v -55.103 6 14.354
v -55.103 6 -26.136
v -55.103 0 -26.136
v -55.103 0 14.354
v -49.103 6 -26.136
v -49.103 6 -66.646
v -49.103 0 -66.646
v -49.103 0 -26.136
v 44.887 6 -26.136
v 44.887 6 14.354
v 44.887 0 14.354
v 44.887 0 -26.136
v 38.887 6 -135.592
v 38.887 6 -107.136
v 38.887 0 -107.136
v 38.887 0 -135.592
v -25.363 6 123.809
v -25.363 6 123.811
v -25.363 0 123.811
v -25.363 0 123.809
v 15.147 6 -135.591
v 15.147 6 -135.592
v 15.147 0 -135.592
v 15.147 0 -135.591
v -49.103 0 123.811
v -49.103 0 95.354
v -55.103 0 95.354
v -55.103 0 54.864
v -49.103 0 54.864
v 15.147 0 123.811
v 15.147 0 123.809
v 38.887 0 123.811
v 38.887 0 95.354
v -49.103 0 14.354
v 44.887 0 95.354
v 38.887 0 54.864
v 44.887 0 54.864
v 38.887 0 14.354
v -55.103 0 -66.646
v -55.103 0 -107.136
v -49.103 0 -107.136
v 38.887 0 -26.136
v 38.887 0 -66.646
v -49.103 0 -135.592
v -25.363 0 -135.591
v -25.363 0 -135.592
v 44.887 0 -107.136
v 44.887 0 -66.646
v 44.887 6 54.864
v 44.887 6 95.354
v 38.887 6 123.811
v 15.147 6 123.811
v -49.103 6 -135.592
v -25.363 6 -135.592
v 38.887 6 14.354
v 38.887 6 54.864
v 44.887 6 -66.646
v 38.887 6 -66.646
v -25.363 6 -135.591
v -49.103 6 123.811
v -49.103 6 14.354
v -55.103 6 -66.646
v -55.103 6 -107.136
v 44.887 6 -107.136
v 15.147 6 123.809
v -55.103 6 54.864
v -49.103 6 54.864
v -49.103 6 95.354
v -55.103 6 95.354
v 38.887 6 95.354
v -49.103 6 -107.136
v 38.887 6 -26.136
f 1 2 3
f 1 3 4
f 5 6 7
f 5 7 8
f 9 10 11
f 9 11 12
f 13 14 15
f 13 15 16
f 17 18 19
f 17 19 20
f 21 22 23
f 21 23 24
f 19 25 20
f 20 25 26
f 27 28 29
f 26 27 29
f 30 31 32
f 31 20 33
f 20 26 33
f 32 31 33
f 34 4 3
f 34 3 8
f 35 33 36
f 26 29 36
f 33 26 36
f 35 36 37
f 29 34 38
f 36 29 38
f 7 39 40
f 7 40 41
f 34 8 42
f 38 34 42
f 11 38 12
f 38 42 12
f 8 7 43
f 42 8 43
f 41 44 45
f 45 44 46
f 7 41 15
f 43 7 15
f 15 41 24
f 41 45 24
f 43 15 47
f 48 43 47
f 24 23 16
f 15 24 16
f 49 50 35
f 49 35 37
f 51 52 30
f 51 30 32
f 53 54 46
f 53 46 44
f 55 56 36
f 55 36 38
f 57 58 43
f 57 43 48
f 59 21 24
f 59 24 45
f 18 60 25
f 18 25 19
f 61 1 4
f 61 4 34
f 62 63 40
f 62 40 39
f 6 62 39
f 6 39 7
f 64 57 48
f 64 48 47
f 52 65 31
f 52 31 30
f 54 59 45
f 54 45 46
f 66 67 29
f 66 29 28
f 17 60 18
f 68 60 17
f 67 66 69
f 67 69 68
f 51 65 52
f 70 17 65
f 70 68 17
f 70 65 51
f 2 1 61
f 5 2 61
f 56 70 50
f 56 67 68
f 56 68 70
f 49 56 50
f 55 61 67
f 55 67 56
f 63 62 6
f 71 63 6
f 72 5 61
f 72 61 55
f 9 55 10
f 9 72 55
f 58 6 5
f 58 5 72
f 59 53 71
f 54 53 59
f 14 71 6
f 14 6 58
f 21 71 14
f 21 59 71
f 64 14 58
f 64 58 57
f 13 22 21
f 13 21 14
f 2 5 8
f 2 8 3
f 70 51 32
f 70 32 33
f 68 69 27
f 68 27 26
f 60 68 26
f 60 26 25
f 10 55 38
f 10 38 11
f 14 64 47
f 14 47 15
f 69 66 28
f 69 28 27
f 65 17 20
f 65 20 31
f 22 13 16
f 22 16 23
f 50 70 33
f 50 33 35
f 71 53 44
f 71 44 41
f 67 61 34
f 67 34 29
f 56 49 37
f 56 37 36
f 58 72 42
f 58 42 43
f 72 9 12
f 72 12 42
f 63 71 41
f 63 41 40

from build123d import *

# Parameters (mm, degrees)
SKETCH1_W               = 517.884603554
SKETCH1_H               = 307.545036654
BOSS_EXTRUDE1_DEPTH     = 6
CUT_EXTRUDE_THIN1_DEPTH = 302.219360338


with BuildPart() as part:
    # Sketch1 → Boss-Extrude1 (new body)
    with BuildSketch(Plane(origin=(0, 0, 0), x_dir=(1, 0, 0), z_dir=(0, 1, 0))):
        Rectangle(SKETCH1_W, SKETCH1_H)
    extrude(amount=BOSS_EXTRUDE1_DEPTH)

    # Sketch2 → Cut-Extrude-Thin1 (cut, through all)
    with BuildSketch(Plane(origin=(0, 6, 0), x_dir=(1, 0, 0), z_dir=(0, 1, 0))):
        Polygon((38.897086644, -123.820706525), (38.897086644, -95.364474608), (44.897086809, -95.364474608), (44.897086809, -54.854473491), (38.897086644, -54.854473491), (38.897086644, -14.364472375), (44.897086809, -14.364472375), (44.897086809, 26.145528742), (38.897086644, 26.145528742), (38.897086644, 66.635529858), (44.897086809, 66.635529858), (44.897086809, 107.145530974), (38.897086644, 107.145530974), (38.897086644, 135.602227437), (15.137085989, 135.602227437), (15.137085989, 135.600548849), (-25.352915127, 135.600548849), (-25.352915127, 135.602227437), (-49.112915782, 135.602227437), (-49.112915782, 107.145530974), (-55.112946465, 107.145530974), (-55.112946465, 66.635529858), (-49.112915782, 66.635529858), (-49.112915782, 26.145528742), (-55.112946465, 26.145528742), (-55.112946465, -14.364472375), (-49.112915782, -14.364472375), (-49.112915782, -54.854473491), (-55.112946465, -54.854473491), (-55.112946465, -95.364474608), (-49.112915782, -95.364474608), (-49.112915782, -123.820706525), (-25.352915127, -123.820706525), (-25.352915127, -123.819461964), (15.137085989, -123.819461964), (15.137085989, -123.820706525), align=None)
        Polygon((38.887086644, -123.810706525), (38.887086644, -95.354474608), (44.887086809, -95.354474608), (44.887086809, -54.864473491), (38.887086644, -54.864473491), (38.887086644, -14.354472375), (44.887086809, -14.354472375), (44.887086809, 26.135528742), (38.887086644, 26.135528742), (38.887086644, 66.645529858), (44.887086809, 66.645529858), (44.887086809, 107.135530974), (38.887086644, 107.135530974), (38.887086644, 135.592227437), (15.147085989, 135.592227437), (15.147085989, 135.590548849), (-25.362915127, 135.590548849), (-25.362915127, 135.592227437), (-49.102915782, 135.592227437), (-49.102915782, 107.135530974), (-55.102946465, 107.135530974), (-55.102946465, 66.645529858), (-49.102915782, 66.645529858), (-49.102915782, 26.135528742), (-55.102946465, 26.135528742), (-55.102946465, -14.354472375), (-49.102915782, -14.354472375), (-49.102915782, -54.864473491), (-55.102946465, -54.864473491), (-55.102946465, -95.354474608), (-49.102915782, -95.354474608), (-49.102915782, -123.810706525), (-25.362915127, -123.810706525), (-25.362915127, -123.809461964), (15.147085989, -123.809461964), (15.147085989, -123.810706525), align=None, mode=Mode.SUBTRACT)
    extrude(amount=-CUT_EXTRUDE_THIN1_DEPTH, mode=Mode.SUBTRACT)


with BuildPart() as body_2:
    # of the pieces the cut leaves, the one that is kept (cut_extrude_thin1_keep)
    add(part.part.solids().sort_by_distance((15.147085989, 0, 123.809461964))[0])


solid = body_2.part
